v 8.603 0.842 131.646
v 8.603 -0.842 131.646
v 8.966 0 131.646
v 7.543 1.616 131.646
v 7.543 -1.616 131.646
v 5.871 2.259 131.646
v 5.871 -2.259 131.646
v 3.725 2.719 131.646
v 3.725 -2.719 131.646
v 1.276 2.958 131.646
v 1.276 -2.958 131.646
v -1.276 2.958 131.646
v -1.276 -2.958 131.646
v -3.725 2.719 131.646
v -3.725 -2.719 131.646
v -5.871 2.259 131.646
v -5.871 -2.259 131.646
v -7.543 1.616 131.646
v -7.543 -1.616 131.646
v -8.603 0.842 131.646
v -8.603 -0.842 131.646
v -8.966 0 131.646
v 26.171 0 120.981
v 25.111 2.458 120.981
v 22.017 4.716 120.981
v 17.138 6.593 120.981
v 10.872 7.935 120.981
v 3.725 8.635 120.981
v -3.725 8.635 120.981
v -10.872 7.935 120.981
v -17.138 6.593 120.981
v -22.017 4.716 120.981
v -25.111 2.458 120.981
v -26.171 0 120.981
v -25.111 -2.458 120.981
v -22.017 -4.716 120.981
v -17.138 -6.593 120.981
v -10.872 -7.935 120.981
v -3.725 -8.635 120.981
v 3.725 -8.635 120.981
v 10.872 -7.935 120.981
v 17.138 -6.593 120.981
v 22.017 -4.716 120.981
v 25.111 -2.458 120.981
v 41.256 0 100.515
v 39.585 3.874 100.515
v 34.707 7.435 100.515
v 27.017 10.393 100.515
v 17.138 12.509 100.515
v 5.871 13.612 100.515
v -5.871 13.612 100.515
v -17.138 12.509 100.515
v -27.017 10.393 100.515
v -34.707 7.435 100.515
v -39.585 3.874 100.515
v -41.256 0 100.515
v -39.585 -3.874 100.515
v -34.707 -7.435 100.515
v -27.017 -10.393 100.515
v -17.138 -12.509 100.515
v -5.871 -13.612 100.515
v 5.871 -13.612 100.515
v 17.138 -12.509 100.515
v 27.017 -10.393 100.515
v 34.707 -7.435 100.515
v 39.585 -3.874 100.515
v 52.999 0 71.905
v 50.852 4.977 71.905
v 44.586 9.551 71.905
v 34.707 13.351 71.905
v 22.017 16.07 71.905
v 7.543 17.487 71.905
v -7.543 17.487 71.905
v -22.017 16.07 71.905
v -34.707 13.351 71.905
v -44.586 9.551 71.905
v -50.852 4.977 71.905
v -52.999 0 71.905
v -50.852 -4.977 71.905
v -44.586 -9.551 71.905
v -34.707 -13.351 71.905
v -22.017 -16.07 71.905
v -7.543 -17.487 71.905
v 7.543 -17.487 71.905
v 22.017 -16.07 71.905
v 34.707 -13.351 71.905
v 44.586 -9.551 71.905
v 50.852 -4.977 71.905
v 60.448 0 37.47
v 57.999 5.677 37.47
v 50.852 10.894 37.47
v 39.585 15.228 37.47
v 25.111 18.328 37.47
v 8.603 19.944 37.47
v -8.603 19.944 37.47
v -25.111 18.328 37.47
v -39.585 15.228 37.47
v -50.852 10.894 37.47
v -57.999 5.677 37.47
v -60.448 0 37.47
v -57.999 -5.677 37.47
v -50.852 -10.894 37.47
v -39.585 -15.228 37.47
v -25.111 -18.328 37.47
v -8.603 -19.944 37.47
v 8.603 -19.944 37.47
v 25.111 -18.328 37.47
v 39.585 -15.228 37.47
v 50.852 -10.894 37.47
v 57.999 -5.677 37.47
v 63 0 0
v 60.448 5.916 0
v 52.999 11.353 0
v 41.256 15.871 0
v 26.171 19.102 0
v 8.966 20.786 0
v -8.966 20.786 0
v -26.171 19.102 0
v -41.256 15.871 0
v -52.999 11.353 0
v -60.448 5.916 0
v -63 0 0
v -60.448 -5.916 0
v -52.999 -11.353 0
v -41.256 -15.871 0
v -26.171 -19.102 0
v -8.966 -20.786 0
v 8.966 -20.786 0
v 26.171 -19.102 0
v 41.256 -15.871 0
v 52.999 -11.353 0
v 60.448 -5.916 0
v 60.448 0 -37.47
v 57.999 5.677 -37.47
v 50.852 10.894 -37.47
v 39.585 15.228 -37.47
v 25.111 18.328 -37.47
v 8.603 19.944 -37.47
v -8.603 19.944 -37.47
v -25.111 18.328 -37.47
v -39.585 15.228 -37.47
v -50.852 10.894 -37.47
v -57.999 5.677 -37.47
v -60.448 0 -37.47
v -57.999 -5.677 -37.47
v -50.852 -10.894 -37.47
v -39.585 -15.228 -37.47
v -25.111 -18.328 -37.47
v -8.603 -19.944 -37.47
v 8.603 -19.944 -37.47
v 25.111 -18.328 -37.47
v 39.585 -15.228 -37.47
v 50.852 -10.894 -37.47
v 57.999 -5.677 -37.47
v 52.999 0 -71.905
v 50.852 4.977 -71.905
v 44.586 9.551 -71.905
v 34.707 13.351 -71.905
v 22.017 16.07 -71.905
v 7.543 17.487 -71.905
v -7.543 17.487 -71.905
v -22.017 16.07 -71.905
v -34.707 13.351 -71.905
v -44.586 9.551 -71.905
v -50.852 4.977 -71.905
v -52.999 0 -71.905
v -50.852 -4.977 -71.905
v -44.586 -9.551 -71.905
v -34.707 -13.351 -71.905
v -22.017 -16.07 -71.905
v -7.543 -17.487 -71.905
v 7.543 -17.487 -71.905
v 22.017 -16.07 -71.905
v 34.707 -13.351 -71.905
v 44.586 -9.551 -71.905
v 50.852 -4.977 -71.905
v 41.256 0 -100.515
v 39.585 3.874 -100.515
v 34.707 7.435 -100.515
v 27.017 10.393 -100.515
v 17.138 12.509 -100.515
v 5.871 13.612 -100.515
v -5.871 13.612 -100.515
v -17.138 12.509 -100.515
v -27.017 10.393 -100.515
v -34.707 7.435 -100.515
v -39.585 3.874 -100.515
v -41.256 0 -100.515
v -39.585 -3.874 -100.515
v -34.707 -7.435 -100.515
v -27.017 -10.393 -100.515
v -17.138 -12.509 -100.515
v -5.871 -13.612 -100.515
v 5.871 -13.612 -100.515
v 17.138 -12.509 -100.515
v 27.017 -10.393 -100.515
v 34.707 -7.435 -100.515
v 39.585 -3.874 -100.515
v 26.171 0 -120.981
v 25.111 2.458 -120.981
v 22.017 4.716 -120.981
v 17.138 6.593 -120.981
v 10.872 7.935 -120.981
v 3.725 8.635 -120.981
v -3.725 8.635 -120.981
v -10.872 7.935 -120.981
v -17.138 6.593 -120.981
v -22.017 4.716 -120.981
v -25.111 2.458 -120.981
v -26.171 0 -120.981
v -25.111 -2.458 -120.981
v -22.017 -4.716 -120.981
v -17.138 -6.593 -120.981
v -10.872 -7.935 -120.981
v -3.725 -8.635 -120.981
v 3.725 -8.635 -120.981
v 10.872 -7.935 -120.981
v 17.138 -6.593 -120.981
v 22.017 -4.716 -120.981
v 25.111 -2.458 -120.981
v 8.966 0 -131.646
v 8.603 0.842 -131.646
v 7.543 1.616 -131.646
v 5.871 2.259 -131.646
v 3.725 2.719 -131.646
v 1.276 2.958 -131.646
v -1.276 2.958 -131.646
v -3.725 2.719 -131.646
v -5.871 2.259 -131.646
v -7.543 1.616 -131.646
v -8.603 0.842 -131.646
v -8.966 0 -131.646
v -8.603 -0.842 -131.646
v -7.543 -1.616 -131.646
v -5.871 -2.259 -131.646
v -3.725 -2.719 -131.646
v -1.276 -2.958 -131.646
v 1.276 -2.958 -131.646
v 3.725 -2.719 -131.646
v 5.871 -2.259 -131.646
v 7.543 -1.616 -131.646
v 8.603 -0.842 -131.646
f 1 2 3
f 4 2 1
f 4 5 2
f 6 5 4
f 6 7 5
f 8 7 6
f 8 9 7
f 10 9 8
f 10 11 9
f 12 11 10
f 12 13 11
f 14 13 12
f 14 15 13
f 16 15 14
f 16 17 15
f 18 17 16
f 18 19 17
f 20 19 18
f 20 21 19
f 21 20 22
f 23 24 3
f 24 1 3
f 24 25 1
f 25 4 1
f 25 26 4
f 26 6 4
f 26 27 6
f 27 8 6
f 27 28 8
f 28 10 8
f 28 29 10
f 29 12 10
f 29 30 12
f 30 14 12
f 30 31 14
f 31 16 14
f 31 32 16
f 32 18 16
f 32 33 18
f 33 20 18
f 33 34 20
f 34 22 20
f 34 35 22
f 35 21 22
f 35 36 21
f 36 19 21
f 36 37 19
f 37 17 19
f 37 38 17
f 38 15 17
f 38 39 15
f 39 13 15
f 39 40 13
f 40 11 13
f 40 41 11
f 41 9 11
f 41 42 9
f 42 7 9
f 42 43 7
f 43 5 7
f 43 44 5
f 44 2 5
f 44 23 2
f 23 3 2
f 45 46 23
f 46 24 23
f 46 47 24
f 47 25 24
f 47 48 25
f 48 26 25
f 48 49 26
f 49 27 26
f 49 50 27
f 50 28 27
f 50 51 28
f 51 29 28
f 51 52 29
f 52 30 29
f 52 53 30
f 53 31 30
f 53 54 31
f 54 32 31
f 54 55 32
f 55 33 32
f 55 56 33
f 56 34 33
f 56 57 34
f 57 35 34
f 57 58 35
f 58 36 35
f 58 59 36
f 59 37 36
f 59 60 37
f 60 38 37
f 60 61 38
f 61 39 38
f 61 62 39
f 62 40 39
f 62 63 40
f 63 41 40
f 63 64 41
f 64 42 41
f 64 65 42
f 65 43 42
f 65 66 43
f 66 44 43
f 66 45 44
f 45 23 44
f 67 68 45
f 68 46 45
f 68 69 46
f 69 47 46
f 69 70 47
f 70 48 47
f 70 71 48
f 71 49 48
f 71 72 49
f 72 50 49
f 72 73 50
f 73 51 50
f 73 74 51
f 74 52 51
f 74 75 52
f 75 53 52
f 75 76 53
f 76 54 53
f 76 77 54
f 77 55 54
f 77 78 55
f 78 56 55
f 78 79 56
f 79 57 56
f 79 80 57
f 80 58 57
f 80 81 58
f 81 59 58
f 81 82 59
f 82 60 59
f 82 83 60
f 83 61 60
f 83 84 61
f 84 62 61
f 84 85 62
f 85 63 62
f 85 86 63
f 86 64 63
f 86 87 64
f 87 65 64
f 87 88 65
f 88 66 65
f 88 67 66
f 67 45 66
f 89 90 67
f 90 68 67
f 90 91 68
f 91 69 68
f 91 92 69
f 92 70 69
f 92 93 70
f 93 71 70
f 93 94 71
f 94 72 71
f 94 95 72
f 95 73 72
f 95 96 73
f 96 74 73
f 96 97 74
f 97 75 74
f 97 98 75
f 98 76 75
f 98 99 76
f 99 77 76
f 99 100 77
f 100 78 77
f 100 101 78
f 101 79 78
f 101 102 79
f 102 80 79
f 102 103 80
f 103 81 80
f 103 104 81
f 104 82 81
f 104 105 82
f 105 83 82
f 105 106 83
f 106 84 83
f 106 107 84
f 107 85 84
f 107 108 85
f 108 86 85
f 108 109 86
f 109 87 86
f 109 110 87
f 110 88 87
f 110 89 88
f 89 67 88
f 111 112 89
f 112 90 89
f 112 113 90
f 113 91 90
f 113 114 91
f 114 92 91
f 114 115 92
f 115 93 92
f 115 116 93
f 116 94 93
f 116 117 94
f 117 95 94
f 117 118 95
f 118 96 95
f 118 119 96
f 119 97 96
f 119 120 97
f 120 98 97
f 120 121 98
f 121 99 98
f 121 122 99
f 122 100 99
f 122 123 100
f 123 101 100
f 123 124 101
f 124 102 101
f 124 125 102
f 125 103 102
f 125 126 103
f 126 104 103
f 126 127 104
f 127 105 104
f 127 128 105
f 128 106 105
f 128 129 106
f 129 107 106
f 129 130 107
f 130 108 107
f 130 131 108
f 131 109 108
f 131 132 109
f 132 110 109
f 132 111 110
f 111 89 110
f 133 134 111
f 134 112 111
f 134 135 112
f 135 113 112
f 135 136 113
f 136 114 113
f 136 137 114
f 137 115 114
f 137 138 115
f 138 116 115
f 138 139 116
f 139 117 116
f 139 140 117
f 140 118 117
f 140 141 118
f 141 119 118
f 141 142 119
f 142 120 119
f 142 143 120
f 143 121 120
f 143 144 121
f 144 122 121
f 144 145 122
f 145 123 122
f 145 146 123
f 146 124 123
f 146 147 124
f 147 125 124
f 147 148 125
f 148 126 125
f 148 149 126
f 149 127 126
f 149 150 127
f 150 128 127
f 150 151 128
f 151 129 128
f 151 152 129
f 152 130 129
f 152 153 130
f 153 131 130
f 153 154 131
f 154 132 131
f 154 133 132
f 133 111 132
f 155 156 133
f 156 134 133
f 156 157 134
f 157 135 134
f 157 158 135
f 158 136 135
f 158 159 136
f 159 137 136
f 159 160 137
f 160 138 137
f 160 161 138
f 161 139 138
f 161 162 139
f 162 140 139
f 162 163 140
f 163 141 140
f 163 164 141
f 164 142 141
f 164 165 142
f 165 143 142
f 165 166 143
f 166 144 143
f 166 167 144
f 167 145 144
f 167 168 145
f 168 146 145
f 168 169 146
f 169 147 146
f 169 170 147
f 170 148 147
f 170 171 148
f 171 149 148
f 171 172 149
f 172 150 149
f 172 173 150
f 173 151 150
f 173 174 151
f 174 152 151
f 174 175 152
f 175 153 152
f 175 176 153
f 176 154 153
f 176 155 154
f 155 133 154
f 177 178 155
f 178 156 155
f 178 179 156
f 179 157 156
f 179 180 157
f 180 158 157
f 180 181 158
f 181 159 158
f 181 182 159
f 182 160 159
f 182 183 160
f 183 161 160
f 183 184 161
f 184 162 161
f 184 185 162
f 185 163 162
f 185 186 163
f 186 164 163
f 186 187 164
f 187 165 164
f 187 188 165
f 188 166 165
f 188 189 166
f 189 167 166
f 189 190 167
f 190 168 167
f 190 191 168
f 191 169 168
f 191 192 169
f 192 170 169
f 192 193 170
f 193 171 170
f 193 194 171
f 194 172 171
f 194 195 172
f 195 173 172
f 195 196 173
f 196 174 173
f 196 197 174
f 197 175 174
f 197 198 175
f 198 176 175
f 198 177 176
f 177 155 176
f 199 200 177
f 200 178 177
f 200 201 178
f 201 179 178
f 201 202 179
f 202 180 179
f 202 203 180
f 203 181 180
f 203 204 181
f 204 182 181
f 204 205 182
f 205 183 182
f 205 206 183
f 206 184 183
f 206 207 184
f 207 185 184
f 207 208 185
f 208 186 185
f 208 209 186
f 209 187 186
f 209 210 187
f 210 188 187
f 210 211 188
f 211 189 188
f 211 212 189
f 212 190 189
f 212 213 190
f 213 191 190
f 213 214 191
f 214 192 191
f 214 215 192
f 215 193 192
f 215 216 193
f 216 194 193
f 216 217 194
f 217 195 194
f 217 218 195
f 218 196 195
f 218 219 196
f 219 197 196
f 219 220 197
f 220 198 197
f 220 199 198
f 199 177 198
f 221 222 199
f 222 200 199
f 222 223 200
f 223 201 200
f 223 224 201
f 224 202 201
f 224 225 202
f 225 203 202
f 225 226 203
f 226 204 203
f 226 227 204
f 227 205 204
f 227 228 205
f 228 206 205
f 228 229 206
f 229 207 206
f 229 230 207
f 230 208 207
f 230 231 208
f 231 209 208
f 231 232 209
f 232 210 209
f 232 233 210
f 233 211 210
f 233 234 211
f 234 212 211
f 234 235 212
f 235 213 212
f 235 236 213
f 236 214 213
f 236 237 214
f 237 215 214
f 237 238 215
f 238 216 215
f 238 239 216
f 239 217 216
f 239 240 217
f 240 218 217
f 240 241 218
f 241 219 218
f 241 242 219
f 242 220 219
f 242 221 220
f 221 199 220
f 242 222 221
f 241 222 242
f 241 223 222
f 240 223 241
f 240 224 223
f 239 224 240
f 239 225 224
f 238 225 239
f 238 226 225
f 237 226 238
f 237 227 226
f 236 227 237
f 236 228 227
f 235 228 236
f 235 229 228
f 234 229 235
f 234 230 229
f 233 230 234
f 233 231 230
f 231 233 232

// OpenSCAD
// Generated by SolidPython 1.0.1 on 2020-07-29 00:46:48


scale(v = [9, 3, 19]) {
	sphere(r = 7);
}
/***********************************************
*********      SolidPython code:      **********
************************************************
 
# import packages: SolidPython
from solid import *
from solid.utils import *
from itertools import chain, combinations, permutations


class Resize:

    def __init__(self, scad_file):
        self.scad_file = scad_file
        #self.scad_file = import_scad(scad_file)
        # cone/cylinder param:
        self.r1 = 0
        self.r2 = 0
        self.h = 0
        # rectangular prism param:
        self.w = 0
        self.l = 0
        # ellipse param:
        self.r = 0

    # import OpenScad code (file name corresponds to shape)


    # classify shape + parameters
    def assign(self, param1, param2, param3):
        if self.scad_file == 'cone.scad':
            self.r1 = param1
            self.r2 = param2
            self.h = param3
        elif self.scad_file == 'cylinder.scad':
            self.r1 = param1
            self.r2 = param2
            self.h = param3
        elif self.scad_file == 'rectangularPrism.scad':
            self.h = param1
            self.l = param2
            self.w = param3
        else:
            self.r = param1
            self.h = param2

    # resize parameters
    def iterate(self):
        x = range(3, 20, 2)
        i = 1
        if self.scad_file == 'cone.scad':
            tempList = list(permutations(x, 2))
            for temp in tempList:
                param1 = temp[0]
                param2 = temp[1]
                filepath = 'produced_scad_files/' + 'cone' + str(param1) + '_' + str(param2) + '_' + '.scad'
                scad_render_to_file(cylinder(h=param1, r1=param2, r2=0), filepath)

        elif self.scad_file == 'cylinder.scad':
            tempList = list(permutations(x, 3))
            for temp in tempList:
                param1 = temp[0]
                param2 = temp[1]
                filepath = 'produced_scad_files/' + 'cylinder' + str(param1) + '_' + str(param2) + '_' + '.scad'
                scad_render_to_file(cylinder(h=param1, r1=param2, r2=param2), filepath)

        elif self.scad_file == 'rectangularPrism.scad':
            tempList = list(permutations(x, 3))
            for temp in tempList:
                param1 = temp[0]
                param2 = temp[1]
                param3 = temp[2]
                filepath = 'produced_scad_files/' + 'rectangularPrism' + str(param1) + '_' + str(param2) + '_' + str(
                    param3) + '.scad'
                scad_render_to_file(cube(size=(param1, param2, param3)), filepath)

        elif self.scad_file == 'ellipse.scad':
            tempList = list(permutations(x, 4))
            for temp in tempList:
                param1 = temp[0]
                param2 = temp[1]
                param3 = temp[2]
                param4 = temp[3]
                filepath = 'produced_scad_files/' + 'ellipse' + str(param1) + '_' + str(param2) + '_' + str(param3) + '_' + str(param4) + '.scad'
                scad_render_to_file(scale([param1, param2, param3])(sphere(r=param4)), filepath)

    def render_to_scadfile(self):
        scad_render_to_file(scad, 'example.scad') 
 
************************************************/
